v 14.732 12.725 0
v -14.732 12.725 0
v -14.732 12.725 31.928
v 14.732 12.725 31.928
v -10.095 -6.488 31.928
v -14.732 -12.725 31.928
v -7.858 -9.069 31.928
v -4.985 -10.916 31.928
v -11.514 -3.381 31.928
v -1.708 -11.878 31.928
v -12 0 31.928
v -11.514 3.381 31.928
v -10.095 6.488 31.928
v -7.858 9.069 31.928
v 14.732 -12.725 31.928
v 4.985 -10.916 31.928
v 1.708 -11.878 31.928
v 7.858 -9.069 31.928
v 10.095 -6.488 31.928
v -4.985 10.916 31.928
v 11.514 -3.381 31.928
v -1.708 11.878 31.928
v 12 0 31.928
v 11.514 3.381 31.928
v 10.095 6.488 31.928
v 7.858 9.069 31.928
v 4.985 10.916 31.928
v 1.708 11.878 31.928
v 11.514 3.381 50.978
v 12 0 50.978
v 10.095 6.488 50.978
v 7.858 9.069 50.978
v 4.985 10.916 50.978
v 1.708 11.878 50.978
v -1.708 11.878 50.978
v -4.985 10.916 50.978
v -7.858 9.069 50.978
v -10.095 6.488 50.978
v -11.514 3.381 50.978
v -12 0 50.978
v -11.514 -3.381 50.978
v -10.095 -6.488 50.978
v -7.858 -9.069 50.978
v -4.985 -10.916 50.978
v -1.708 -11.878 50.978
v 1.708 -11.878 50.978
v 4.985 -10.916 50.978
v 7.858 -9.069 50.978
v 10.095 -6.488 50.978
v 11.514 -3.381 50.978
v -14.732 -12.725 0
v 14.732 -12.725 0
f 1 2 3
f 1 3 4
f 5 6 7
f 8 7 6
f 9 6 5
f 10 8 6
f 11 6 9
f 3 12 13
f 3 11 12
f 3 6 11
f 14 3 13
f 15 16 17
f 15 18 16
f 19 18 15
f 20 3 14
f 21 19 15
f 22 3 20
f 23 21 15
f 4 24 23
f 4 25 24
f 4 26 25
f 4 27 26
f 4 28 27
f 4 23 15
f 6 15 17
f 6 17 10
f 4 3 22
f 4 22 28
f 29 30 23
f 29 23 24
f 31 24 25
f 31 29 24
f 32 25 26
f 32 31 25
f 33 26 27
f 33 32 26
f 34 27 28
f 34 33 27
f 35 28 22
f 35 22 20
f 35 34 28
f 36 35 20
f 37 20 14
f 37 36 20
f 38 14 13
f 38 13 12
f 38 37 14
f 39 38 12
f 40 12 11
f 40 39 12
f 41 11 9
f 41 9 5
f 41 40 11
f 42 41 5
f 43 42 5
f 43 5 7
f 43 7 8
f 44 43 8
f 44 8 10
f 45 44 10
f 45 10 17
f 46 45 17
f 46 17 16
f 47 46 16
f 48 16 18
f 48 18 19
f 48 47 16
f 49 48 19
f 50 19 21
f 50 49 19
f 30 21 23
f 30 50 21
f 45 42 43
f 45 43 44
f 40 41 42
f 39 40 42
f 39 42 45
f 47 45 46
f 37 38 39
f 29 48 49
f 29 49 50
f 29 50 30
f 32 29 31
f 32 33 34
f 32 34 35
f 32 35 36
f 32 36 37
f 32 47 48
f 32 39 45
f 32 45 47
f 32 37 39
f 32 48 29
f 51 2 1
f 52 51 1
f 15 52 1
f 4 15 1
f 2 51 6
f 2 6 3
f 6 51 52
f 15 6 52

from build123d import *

# Parameters (mm, degrees)
F0_W     = 29.464
F0_H     = 25.4508
F1_DEPTH = 50.9778
F2_W     = 39.90591
F2_H     = 36.580414
F2_R     = 12
F3_DEPTH = 19.05


with BuildPart() as f1:
    # F0 (on Top) → F1 (new body)
    with BuildSketch(Plane.XY):
        Rectangle(F0_W, F0_H)
    extrude(amount=F1_DEPTH)

    # F2 (on face) → F3 (cut)
    with BuildSketch(Plane.XY.offset(50.9778)):
        Rectangle(F2_W, F2_H)
        Circle(F2_R, mode=Mode.SUBTRACT)
    extrude(amount=-F3_DEPTH, mode=Mode.SUBTRACT)


solid = f1.part
